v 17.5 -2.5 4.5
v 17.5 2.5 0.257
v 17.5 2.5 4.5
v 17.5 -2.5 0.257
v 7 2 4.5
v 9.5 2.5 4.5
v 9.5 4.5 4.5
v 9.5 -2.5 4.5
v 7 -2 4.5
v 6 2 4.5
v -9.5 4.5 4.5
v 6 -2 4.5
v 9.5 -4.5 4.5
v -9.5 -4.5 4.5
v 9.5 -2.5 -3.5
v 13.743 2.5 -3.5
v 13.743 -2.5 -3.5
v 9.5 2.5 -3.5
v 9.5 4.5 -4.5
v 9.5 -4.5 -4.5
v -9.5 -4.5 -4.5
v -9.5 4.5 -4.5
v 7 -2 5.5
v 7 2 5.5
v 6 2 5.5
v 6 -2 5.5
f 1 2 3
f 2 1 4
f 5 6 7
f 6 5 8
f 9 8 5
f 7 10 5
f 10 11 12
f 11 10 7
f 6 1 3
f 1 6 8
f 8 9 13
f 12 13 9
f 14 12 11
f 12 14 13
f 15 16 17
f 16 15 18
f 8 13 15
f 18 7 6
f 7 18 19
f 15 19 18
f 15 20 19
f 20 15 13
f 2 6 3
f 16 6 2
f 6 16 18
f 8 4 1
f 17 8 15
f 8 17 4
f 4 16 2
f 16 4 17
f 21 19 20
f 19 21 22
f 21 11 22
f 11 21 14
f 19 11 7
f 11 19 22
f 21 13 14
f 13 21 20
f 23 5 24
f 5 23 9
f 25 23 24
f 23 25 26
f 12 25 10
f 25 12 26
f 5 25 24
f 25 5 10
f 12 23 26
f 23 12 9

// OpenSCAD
module babygate_latch()

{
	// body
	color ("grey")
	cube([190, 90, 90], center=true);

	// nub for spring
	module nub()
	{
	rotate(90, [1, 0, 0])
	rotate(90, [0, 1, 0])
	translate([0, 0, -120])
	color("red") cylinder(r=20, h=30);
	}
	//nub();

	// latch
	translate([135, 0, 5])  
	color("grey") 
	difference() 
	{
		cube([80, 50, 80], center=true);
		// subtract corner
		rotate(45, [0, 1, 0])
		translate([60, 0, 0]) 
		cube([60, 60, 60], center=true);
	}	

	// catch
	translate([65, 0, 50])
	cube([10, 40, 10], center=true);

}
scale([0.1, 0.1, 0.1]) // to mm
babygate_latch();
